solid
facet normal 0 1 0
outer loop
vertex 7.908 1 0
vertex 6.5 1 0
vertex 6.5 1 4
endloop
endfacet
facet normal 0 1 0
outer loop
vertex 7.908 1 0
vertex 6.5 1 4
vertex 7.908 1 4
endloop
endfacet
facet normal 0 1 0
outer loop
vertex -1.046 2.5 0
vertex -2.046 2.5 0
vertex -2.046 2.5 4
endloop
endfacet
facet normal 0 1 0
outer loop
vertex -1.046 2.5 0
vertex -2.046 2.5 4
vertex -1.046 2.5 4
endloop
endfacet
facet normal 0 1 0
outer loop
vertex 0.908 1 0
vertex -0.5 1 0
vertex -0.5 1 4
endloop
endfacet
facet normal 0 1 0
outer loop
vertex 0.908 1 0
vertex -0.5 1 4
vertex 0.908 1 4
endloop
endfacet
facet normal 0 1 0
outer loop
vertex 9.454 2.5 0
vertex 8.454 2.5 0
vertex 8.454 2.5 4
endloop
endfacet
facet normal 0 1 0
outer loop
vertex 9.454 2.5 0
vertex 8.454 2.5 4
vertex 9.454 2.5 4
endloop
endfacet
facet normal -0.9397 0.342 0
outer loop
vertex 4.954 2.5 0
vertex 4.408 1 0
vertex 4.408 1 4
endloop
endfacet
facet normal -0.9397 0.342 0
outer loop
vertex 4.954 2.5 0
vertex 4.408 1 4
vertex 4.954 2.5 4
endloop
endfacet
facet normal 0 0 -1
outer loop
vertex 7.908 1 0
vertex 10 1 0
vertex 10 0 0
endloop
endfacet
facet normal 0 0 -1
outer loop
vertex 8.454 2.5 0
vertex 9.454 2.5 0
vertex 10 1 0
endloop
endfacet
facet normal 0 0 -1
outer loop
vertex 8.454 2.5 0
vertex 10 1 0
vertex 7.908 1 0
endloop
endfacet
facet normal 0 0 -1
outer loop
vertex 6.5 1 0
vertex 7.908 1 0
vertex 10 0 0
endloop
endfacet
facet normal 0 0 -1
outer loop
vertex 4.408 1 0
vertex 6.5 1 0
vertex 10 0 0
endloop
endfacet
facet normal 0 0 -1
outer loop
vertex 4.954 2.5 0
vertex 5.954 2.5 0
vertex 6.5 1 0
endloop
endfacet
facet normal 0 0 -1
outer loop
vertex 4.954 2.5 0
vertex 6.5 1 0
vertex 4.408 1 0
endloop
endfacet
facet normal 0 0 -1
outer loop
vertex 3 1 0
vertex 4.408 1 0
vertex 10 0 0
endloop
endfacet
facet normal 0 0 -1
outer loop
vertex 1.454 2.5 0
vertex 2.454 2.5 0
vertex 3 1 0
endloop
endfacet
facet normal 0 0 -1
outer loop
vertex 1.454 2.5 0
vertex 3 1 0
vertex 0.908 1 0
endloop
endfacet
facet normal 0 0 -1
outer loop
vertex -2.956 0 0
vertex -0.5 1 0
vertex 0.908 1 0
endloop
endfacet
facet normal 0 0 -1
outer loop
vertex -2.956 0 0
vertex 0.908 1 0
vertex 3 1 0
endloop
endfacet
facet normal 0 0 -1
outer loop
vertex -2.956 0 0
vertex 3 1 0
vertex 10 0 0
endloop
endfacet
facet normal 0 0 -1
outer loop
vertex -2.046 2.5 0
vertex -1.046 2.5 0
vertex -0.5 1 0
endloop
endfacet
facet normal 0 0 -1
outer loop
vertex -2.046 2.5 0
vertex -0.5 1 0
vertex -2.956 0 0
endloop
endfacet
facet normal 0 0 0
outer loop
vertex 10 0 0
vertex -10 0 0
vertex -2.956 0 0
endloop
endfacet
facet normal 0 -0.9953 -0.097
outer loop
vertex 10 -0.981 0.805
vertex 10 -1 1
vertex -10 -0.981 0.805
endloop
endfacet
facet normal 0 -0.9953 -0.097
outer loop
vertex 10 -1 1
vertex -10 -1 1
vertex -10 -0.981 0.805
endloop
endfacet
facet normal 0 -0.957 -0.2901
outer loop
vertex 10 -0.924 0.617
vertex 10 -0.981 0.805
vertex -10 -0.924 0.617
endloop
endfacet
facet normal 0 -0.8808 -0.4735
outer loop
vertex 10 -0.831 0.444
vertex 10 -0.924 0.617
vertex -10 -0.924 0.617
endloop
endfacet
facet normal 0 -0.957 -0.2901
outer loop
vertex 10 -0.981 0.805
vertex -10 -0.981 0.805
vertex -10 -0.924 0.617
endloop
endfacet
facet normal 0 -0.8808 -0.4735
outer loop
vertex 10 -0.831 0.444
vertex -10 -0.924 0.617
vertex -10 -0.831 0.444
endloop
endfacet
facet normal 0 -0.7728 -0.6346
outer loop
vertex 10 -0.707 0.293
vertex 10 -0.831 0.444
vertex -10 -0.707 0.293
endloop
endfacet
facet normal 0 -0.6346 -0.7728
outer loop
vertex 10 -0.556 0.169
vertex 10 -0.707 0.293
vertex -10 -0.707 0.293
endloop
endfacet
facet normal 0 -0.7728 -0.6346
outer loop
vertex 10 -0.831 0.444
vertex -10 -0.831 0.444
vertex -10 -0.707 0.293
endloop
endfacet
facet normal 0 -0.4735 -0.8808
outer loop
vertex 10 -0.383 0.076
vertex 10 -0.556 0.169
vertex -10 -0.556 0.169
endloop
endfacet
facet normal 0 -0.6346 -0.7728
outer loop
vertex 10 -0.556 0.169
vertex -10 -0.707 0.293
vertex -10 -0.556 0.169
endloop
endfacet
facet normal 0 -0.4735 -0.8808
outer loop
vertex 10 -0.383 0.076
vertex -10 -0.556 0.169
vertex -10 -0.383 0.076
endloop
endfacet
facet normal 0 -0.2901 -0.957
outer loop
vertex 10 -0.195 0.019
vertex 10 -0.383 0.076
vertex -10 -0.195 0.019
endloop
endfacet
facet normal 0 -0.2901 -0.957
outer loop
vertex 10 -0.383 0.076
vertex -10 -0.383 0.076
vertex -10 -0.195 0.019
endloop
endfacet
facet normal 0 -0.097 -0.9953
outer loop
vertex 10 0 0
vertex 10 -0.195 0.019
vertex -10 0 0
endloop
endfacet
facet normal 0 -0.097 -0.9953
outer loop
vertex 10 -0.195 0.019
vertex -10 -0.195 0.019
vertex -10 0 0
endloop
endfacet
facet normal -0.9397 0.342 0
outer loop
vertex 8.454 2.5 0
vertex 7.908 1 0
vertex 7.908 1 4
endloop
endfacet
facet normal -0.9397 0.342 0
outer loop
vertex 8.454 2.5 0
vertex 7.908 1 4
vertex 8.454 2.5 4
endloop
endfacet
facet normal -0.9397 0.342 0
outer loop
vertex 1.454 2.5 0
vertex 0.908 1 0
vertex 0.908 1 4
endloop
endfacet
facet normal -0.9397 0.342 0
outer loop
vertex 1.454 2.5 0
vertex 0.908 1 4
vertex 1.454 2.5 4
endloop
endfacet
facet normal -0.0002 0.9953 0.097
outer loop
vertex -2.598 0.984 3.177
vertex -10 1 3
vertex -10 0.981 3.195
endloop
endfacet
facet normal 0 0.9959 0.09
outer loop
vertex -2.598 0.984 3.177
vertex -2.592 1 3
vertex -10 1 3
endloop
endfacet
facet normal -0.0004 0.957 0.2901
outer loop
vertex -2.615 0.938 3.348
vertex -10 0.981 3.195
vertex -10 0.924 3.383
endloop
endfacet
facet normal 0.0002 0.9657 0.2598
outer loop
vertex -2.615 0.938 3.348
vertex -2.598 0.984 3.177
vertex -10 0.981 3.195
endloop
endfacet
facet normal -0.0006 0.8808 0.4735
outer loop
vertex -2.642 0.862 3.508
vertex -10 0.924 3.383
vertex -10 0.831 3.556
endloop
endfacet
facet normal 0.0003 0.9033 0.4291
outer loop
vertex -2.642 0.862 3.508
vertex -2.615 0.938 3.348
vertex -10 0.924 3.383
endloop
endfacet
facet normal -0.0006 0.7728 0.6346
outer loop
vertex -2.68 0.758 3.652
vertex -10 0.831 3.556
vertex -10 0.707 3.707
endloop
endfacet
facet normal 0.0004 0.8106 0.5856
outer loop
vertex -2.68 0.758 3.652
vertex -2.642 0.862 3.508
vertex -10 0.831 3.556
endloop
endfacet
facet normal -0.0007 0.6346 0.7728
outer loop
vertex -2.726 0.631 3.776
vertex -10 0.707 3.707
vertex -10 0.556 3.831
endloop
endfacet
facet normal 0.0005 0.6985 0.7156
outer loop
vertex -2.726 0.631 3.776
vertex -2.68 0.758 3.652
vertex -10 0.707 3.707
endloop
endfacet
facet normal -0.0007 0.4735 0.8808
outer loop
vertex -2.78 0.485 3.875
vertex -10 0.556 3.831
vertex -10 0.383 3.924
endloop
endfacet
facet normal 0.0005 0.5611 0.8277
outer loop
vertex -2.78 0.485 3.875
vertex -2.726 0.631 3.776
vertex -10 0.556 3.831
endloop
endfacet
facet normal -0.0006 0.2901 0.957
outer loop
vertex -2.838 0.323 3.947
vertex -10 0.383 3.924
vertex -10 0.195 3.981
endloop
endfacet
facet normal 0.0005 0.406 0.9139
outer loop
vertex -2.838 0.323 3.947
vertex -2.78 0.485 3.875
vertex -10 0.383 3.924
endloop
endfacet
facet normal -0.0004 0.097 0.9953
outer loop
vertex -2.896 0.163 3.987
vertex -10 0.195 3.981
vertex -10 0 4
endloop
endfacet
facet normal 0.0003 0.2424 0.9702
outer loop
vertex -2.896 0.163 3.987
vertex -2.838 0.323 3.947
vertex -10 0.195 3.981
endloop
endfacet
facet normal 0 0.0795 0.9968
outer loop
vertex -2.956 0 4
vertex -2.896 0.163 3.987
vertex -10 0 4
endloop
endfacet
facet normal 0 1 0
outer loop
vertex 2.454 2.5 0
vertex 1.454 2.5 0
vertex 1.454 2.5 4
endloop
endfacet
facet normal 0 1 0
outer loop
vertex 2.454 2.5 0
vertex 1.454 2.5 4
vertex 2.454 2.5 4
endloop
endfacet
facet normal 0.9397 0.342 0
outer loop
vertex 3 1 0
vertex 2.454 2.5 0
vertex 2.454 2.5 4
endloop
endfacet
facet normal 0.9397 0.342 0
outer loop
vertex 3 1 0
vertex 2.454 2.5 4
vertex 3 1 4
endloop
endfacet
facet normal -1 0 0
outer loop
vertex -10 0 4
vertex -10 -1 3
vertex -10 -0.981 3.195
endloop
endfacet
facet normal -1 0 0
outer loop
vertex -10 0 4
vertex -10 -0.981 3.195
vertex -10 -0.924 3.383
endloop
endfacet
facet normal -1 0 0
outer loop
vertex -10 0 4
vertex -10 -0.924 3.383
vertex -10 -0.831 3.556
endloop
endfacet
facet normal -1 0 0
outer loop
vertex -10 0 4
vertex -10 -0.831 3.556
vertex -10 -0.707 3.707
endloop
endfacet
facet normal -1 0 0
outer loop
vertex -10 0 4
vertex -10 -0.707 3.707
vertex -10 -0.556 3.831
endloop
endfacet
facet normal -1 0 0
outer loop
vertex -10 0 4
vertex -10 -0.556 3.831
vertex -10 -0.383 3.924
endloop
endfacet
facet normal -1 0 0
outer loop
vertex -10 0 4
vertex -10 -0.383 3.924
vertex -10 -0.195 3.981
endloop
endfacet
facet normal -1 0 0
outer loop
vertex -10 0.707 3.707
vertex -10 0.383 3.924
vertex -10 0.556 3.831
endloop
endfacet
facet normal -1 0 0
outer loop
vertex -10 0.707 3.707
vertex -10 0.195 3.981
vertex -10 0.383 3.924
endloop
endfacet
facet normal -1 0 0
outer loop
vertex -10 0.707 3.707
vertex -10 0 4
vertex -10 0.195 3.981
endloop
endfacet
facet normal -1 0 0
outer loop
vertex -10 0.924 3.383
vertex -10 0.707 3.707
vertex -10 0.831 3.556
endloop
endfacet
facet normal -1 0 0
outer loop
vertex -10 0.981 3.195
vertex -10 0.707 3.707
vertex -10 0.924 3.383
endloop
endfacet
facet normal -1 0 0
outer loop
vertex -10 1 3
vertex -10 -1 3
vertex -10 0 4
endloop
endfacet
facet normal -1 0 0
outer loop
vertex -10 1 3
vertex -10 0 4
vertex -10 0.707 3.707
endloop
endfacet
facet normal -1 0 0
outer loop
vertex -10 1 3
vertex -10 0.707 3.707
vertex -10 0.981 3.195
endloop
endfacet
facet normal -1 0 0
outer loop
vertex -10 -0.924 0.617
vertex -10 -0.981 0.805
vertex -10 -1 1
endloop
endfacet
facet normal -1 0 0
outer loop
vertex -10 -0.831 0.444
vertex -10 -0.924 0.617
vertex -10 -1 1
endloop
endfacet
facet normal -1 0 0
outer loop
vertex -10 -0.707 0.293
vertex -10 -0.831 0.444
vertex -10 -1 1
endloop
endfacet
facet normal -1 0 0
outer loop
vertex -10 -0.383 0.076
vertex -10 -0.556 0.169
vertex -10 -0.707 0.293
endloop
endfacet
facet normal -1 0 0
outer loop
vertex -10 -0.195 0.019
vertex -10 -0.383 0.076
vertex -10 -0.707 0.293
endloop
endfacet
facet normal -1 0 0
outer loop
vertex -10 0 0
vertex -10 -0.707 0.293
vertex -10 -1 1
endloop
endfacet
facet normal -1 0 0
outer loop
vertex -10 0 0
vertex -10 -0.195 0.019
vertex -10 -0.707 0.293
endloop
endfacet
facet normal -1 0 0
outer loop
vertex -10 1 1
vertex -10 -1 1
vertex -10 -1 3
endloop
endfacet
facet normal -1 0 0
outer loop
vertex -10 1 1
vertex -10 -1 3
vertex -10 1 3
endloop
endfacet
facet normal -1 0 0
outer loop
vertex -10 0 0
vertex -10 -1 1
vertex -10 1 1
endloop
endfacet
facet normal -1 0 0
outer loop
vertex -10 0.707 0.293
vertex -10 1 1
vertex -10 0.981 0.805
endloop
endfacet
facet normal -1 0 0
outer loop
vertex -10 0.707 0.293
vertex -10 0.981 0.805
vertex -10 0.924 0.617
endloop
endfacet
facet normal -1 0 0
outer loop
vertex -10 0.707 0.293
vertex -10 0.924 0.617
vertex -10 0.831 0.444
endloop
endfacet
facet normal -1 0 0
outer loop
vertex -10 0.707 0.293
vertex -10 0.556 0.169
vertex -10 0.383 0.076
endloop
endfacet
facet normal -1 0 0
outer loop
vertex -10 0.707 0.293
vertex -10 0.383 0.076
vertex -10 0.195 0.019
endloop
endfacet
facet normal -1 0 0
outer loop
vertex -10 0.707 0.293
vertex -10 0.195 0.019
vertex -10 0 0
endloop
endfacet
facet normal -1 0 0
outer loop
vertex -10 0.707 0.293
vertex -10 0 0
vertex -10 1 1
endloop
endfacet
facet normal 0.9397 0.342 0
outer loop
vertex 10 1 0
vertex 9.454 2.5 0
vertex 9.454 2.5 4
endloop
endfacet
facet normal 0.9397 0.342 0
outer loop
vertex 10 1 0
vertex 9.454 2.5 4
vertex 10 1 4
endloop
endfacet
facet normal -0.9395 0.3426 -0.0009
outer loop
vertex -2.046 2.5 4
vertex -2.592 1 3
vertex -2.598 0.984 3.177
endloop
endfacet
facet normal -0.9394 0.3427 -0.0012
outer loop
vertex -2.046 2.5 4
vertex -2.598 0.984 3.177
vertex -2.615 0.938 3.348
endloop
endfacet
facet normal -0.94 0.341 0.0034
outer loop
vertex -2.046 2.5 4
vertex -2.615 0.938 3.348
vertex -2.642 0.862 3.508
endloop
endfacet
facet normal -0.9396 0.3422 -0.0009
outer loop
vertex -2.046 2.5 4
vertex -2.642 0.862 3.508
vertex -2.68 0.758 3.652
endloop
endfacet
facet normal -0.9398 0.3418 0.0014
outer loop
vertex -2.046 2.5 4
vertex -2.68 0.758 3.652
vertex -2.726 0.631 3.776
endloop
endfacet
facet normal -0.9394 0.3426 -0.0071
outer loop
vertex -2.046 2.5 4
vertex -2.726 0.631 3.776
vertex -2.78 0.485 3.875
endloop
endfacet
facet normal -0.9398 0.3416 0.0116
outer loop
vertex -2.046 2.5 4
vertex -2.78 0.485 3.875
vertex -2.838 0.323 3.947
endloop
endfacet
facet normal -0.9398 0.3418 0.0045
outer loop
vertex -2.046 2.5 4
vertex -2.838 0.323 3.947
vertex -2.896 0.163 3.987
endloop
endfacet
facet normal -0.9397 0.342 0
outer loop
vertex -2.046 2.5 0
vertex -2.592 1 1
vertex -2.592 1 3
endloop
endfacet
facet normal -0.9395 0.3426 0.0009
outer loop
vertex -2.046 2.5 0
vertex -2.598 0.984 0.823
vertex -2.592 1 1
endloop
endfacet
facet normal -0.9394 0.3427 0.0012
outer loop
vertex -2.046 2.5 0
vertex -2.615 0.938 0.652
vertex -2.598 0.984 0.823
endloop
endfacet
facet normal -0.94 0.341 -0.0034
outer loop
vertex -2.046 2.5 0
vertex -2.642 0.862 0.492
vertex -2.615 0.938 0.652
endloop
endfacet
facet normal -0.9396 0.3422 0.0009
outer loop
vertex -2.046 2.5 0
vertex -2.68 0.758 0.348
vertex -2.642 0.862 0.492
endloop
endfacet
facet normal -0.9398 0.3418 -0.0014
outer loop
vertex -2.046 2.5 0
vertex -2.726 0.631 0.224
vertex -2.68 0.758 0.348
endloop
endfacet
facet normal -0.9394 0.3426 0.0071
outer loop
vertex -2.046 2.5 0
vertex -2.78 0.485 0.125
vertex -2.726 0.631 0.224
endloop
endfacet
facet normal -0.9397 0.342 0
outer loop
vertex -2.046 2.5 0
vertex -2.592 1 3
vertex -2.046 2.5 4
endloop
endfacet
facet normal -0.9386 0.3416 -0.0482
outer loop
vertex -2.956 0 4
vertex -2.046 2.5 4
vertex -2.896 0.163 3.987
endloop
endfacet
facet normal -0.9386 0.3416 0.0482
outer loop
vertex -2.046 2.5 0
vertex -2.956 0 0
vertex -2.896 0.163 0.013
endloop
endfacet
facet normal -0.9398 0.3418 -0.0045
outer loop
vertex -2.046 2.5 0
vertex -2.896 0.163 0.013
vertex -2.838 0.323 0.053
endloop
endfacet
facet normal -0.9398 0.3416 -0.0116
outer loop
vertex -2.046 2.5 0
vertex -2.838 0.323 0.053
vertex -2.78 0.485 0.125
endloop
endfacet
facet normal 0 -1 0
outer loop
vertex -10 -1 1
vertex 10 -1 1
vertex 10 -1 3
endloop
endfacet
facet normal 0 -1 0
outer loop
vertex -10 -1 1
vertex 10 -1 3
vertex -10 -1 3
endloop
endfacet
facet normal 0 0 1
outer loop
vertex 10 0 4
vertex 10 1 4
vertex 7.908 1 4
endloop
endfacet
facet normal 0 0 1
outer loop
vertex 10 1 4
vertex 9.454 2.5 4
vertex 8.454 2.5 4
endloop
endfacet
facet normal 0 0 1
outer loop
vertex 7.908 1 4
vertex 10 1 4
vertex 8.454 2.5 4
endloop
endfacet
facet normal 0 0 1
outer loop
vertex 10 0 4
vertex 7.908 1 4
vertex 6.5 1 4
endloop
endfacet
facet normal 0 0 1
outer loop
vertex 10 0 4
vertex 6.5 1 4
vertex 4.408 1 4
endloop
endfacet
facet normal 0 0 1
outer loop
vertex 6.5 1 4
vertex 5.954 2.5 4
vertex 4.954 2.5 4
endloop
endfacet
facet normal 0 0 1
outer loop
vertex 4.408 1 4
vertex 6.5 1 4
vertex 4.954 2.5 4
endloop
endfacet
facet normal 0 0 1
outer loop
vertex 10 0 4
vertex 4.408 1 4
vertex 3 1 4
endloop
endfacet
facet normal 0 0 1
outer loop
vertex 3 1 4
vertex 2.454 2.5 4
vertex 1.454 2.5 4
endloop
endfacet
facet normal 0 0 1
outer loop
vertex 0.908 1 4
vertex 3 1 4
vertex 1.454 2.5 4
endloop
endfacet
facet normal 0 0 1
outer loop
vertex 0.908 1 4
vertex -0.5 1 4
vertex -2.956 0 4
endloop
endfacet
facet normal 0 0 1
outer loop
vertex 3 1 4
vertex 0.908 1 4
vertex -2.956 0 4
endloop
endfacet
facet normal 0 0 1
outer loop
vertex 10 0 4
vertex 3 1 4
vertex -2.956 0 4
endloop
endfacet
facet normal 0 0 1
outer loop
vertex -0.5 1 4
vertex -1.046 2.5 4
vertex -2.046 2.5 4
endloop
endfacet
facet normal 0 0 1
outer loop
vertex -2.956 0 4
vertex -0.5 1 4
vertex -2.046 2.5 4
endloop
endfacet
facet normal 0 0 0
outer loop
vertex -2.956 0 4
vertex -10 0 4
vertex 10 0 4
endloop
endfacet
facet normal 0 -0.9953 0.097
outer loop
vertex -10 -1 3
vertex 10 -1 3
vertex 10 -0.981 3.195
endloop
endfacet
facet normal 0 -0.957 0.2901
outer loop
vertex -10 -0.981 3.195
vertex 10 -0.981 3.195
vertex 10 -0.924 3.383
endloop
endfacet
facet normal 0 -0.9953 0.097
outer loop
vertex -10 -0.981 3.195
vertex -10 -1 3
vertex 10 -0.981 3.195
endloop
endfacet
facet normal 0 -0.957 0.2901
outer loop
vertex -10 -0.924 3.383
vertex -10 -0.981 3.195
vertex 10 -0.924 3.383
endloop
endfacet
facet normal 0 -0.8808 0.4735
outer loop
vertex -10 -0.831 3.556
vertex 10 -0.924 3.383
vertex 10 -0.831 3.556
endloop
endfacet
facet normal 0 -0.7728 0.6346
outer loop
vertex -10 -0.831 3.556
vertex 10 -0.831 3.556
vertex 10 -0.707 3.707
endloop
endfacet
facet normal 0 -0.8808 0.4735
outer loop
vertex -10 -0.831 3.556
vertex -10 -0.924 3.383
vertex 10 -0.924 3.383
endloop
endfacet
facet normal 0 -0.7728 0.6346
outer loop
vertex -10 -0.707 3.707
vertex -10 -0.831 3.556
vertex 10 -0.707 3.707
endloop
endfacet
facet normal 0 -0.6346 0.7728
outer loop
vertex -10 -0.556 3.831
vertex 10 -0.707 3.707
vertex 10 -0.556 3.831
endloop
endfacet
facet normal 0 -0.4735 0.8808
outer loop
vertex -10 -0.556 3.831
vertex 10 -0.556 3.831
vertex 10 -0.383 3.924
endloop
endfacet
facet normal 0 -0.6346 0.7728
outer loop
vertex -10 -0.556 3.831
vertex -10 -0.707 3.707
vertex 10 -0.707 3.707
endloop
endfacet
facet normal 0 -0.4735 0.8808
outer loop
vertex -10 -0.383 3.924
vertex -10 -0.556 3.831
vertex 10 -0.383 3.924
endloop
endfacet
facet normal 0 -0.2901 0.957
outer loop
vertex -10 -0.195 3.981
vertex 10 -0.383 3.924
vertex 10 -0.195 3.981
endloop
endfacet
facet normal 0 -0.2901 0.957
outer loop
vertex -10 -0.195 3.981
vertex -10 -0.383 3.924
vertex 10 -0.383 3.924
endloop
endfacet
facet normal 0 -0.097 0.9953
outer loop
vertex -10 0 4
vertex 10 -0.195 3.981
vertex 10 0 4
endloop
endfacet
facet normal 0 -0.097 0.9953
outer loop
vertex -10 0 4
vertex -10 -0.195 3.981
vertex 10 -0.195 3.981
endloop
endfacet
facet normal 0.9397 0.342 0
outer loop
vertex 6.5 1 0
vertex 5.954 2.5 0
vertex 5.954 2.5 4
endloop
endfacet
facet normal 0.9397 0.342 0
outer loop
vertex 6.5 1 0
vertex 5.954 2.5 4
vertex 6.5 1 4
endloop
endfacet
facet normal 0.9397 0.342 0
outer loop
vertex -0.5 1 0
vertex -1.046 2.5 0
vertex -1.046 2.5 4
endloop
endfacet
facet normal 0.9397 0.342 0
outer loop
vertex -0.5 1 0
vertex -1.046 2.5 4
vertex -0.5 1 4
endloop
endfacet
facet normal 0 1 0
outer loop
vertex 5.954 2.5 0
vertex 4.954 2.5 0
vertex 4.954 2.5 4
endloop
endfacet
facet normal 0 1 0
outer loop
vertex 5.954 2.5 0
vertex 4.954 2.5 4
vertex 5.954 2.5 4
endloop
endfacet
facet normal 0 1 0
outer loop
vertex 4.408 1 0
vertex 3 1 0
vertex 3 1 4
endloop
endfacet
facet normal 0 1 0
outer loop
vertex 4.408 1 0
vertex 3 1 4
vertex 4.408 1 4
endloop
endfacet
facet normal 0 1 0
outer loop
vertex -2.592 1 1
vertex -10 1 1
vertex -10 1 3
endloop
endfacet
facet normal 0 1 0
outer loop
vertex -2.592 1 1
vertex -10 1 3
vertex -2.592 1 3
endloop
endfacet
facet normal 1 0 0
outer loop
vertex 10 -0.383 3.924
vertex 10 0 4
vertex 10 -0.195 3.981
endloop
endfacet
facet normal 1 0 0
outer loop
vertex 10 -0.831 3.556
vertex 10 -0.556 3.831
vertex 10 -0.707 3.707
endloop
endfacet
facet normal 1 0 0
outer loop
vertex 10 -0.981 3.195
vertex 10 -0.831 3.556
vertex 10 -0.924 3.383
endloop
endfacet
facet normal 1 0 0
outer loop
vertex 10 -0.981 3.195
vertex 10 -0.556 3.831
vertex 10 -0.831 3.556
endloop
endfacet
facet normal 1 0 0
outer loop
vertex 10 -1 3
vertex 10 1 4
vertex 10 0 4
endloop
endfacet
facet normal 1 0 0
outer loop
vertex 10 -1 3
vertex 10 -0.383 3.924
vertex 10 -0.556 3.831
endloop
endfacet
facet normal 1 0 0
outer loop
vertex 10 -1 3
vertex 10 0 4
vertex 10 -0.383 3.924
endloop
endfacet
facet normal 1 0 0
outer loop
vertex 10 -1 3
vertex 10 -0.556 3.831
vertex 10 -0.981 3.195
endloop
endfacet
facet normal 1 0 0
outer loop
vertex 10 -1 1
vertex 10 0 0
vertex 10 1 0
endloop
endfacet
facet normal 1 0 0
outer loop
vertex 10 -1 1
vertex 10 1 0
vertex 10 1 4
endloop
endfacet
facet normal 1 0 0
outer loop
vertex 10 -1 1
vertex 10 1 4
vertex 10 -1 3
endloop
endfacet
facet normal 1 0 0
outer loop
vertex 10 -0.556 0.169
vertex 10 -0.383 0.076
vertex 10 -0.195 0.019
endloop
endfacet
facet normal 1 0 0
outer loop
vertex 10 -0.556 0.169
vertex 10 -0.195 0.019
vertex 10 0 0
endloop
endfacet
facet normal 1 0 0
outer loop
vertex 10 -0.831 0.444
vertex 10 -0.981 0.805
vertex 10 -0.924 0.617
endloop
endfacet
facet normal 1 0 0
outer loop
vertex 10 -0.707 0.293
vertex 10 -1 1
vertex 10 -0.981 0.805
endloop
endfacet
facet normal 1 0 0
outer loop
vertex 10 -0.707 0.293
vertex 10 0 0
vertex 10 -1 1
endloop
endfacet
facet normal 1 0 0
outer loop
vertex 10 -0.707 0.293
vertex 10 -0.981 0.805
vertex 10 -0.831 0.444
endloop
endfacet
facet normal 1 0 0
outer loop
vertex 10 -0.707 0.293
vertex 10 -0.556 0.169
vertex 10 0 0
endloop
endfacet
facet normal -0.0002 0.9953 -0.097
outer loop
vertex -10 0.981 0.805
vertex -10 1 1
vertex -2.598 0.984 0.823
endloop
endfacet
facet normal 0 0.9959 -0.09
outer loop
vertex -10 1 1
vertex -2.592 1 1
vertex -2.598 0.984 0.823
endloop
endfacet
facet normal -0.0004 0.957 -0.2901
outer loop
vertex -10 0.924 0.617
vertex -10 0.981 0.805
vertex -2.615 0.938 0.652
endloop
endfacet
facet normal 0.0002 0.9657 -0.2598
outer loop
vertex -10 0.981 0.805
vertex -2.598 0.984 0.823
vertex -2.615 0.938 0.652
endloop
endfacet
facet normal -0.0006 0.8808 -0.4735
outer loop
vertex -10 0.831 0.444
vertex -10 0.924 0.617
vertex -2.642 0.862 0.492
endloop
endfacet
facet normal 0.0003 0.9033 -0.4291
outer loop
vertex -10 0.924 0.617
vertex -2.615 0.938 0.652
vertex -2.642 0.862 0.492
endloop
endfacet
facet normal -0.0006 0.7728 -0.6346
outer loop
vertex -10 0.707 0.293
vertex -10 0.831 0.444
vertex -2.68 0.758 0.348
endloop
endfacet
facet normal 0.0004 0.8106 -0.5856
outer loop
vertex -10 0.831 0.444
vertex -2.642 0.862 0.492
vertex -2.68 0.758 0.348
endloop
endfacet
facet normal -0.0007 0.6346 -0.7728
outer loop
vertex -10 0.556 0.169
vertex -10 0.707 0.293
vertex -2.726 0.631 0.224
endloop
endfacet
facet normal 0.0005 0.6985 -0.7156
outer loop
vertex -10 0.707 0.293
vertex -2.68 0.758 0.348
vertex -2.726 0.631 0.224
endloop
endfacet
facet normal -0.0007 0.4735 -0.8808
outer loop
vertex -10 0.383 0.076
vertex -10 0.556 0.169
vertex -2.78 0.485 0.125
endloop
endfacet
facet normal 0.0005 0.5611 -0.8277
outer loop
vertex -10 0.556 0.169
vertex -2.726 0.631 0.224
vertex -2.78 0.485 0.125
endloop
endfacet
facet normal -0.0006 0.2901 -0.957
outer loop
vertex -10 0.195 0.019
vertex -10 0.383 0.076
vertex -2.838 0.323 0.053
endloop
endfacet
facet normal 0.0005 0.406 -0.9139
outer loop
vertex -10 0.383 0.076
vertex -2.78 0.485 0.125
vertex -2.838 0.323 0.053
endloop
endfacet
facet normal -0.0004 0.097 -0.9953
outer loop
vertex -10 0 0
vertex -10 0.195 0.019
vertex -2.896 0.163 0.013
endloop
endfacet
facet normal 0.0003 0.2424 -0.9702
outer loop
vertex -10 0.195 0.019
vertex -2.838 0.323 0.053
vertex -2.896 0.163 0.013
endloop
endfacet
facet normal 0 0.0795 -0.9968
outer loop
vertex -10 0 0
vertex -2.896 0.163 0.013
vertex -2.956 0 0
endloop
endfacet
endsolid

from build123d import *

# Parameters (mm, degrees)
BOSS_EXTRUDE1_DEPTH = 4
FILLET1_R           = 1


with BuildPart() as part:
    # Sketch1 → Boss-Extrude1 (new body)
    with BuildSketch(Plane.XY):
        Polygon((6.5, 1), (7.908089297, 1), (8.454044649, 2.5), (9.454044649, 2.5), (10, 1), (10, -1), (-10, -1), (-10, 1), (-2.591910703, 1), (-2.045955351, 2.5), (-1.045955351, 2.5), (-0.5, 1), (0.908089297, 1), (1.454044649, 2.5), (2.454044649, 2.5), (3, 1), (4.408089297, 1), (4.954044649, 2.5), (5.954044649, 2.5), align=None)
    extrude(amount=BOSS_EXTRUDE1_DEPTH)

    # Fillet1
    fillet1_edges = [part.edges().sort_by_distance(p)[0] for p in [
        (0, -1, 4),
        (0, -1, 0),
        (-6.295955351, 1, 0),
        (-6.295955351, 1, 4),
    ]]
    fillet(fillet1_edges, radius=FILLET1_R - 0.0001)  # a hair under: the kernel refuses the full size


solid = part.part
